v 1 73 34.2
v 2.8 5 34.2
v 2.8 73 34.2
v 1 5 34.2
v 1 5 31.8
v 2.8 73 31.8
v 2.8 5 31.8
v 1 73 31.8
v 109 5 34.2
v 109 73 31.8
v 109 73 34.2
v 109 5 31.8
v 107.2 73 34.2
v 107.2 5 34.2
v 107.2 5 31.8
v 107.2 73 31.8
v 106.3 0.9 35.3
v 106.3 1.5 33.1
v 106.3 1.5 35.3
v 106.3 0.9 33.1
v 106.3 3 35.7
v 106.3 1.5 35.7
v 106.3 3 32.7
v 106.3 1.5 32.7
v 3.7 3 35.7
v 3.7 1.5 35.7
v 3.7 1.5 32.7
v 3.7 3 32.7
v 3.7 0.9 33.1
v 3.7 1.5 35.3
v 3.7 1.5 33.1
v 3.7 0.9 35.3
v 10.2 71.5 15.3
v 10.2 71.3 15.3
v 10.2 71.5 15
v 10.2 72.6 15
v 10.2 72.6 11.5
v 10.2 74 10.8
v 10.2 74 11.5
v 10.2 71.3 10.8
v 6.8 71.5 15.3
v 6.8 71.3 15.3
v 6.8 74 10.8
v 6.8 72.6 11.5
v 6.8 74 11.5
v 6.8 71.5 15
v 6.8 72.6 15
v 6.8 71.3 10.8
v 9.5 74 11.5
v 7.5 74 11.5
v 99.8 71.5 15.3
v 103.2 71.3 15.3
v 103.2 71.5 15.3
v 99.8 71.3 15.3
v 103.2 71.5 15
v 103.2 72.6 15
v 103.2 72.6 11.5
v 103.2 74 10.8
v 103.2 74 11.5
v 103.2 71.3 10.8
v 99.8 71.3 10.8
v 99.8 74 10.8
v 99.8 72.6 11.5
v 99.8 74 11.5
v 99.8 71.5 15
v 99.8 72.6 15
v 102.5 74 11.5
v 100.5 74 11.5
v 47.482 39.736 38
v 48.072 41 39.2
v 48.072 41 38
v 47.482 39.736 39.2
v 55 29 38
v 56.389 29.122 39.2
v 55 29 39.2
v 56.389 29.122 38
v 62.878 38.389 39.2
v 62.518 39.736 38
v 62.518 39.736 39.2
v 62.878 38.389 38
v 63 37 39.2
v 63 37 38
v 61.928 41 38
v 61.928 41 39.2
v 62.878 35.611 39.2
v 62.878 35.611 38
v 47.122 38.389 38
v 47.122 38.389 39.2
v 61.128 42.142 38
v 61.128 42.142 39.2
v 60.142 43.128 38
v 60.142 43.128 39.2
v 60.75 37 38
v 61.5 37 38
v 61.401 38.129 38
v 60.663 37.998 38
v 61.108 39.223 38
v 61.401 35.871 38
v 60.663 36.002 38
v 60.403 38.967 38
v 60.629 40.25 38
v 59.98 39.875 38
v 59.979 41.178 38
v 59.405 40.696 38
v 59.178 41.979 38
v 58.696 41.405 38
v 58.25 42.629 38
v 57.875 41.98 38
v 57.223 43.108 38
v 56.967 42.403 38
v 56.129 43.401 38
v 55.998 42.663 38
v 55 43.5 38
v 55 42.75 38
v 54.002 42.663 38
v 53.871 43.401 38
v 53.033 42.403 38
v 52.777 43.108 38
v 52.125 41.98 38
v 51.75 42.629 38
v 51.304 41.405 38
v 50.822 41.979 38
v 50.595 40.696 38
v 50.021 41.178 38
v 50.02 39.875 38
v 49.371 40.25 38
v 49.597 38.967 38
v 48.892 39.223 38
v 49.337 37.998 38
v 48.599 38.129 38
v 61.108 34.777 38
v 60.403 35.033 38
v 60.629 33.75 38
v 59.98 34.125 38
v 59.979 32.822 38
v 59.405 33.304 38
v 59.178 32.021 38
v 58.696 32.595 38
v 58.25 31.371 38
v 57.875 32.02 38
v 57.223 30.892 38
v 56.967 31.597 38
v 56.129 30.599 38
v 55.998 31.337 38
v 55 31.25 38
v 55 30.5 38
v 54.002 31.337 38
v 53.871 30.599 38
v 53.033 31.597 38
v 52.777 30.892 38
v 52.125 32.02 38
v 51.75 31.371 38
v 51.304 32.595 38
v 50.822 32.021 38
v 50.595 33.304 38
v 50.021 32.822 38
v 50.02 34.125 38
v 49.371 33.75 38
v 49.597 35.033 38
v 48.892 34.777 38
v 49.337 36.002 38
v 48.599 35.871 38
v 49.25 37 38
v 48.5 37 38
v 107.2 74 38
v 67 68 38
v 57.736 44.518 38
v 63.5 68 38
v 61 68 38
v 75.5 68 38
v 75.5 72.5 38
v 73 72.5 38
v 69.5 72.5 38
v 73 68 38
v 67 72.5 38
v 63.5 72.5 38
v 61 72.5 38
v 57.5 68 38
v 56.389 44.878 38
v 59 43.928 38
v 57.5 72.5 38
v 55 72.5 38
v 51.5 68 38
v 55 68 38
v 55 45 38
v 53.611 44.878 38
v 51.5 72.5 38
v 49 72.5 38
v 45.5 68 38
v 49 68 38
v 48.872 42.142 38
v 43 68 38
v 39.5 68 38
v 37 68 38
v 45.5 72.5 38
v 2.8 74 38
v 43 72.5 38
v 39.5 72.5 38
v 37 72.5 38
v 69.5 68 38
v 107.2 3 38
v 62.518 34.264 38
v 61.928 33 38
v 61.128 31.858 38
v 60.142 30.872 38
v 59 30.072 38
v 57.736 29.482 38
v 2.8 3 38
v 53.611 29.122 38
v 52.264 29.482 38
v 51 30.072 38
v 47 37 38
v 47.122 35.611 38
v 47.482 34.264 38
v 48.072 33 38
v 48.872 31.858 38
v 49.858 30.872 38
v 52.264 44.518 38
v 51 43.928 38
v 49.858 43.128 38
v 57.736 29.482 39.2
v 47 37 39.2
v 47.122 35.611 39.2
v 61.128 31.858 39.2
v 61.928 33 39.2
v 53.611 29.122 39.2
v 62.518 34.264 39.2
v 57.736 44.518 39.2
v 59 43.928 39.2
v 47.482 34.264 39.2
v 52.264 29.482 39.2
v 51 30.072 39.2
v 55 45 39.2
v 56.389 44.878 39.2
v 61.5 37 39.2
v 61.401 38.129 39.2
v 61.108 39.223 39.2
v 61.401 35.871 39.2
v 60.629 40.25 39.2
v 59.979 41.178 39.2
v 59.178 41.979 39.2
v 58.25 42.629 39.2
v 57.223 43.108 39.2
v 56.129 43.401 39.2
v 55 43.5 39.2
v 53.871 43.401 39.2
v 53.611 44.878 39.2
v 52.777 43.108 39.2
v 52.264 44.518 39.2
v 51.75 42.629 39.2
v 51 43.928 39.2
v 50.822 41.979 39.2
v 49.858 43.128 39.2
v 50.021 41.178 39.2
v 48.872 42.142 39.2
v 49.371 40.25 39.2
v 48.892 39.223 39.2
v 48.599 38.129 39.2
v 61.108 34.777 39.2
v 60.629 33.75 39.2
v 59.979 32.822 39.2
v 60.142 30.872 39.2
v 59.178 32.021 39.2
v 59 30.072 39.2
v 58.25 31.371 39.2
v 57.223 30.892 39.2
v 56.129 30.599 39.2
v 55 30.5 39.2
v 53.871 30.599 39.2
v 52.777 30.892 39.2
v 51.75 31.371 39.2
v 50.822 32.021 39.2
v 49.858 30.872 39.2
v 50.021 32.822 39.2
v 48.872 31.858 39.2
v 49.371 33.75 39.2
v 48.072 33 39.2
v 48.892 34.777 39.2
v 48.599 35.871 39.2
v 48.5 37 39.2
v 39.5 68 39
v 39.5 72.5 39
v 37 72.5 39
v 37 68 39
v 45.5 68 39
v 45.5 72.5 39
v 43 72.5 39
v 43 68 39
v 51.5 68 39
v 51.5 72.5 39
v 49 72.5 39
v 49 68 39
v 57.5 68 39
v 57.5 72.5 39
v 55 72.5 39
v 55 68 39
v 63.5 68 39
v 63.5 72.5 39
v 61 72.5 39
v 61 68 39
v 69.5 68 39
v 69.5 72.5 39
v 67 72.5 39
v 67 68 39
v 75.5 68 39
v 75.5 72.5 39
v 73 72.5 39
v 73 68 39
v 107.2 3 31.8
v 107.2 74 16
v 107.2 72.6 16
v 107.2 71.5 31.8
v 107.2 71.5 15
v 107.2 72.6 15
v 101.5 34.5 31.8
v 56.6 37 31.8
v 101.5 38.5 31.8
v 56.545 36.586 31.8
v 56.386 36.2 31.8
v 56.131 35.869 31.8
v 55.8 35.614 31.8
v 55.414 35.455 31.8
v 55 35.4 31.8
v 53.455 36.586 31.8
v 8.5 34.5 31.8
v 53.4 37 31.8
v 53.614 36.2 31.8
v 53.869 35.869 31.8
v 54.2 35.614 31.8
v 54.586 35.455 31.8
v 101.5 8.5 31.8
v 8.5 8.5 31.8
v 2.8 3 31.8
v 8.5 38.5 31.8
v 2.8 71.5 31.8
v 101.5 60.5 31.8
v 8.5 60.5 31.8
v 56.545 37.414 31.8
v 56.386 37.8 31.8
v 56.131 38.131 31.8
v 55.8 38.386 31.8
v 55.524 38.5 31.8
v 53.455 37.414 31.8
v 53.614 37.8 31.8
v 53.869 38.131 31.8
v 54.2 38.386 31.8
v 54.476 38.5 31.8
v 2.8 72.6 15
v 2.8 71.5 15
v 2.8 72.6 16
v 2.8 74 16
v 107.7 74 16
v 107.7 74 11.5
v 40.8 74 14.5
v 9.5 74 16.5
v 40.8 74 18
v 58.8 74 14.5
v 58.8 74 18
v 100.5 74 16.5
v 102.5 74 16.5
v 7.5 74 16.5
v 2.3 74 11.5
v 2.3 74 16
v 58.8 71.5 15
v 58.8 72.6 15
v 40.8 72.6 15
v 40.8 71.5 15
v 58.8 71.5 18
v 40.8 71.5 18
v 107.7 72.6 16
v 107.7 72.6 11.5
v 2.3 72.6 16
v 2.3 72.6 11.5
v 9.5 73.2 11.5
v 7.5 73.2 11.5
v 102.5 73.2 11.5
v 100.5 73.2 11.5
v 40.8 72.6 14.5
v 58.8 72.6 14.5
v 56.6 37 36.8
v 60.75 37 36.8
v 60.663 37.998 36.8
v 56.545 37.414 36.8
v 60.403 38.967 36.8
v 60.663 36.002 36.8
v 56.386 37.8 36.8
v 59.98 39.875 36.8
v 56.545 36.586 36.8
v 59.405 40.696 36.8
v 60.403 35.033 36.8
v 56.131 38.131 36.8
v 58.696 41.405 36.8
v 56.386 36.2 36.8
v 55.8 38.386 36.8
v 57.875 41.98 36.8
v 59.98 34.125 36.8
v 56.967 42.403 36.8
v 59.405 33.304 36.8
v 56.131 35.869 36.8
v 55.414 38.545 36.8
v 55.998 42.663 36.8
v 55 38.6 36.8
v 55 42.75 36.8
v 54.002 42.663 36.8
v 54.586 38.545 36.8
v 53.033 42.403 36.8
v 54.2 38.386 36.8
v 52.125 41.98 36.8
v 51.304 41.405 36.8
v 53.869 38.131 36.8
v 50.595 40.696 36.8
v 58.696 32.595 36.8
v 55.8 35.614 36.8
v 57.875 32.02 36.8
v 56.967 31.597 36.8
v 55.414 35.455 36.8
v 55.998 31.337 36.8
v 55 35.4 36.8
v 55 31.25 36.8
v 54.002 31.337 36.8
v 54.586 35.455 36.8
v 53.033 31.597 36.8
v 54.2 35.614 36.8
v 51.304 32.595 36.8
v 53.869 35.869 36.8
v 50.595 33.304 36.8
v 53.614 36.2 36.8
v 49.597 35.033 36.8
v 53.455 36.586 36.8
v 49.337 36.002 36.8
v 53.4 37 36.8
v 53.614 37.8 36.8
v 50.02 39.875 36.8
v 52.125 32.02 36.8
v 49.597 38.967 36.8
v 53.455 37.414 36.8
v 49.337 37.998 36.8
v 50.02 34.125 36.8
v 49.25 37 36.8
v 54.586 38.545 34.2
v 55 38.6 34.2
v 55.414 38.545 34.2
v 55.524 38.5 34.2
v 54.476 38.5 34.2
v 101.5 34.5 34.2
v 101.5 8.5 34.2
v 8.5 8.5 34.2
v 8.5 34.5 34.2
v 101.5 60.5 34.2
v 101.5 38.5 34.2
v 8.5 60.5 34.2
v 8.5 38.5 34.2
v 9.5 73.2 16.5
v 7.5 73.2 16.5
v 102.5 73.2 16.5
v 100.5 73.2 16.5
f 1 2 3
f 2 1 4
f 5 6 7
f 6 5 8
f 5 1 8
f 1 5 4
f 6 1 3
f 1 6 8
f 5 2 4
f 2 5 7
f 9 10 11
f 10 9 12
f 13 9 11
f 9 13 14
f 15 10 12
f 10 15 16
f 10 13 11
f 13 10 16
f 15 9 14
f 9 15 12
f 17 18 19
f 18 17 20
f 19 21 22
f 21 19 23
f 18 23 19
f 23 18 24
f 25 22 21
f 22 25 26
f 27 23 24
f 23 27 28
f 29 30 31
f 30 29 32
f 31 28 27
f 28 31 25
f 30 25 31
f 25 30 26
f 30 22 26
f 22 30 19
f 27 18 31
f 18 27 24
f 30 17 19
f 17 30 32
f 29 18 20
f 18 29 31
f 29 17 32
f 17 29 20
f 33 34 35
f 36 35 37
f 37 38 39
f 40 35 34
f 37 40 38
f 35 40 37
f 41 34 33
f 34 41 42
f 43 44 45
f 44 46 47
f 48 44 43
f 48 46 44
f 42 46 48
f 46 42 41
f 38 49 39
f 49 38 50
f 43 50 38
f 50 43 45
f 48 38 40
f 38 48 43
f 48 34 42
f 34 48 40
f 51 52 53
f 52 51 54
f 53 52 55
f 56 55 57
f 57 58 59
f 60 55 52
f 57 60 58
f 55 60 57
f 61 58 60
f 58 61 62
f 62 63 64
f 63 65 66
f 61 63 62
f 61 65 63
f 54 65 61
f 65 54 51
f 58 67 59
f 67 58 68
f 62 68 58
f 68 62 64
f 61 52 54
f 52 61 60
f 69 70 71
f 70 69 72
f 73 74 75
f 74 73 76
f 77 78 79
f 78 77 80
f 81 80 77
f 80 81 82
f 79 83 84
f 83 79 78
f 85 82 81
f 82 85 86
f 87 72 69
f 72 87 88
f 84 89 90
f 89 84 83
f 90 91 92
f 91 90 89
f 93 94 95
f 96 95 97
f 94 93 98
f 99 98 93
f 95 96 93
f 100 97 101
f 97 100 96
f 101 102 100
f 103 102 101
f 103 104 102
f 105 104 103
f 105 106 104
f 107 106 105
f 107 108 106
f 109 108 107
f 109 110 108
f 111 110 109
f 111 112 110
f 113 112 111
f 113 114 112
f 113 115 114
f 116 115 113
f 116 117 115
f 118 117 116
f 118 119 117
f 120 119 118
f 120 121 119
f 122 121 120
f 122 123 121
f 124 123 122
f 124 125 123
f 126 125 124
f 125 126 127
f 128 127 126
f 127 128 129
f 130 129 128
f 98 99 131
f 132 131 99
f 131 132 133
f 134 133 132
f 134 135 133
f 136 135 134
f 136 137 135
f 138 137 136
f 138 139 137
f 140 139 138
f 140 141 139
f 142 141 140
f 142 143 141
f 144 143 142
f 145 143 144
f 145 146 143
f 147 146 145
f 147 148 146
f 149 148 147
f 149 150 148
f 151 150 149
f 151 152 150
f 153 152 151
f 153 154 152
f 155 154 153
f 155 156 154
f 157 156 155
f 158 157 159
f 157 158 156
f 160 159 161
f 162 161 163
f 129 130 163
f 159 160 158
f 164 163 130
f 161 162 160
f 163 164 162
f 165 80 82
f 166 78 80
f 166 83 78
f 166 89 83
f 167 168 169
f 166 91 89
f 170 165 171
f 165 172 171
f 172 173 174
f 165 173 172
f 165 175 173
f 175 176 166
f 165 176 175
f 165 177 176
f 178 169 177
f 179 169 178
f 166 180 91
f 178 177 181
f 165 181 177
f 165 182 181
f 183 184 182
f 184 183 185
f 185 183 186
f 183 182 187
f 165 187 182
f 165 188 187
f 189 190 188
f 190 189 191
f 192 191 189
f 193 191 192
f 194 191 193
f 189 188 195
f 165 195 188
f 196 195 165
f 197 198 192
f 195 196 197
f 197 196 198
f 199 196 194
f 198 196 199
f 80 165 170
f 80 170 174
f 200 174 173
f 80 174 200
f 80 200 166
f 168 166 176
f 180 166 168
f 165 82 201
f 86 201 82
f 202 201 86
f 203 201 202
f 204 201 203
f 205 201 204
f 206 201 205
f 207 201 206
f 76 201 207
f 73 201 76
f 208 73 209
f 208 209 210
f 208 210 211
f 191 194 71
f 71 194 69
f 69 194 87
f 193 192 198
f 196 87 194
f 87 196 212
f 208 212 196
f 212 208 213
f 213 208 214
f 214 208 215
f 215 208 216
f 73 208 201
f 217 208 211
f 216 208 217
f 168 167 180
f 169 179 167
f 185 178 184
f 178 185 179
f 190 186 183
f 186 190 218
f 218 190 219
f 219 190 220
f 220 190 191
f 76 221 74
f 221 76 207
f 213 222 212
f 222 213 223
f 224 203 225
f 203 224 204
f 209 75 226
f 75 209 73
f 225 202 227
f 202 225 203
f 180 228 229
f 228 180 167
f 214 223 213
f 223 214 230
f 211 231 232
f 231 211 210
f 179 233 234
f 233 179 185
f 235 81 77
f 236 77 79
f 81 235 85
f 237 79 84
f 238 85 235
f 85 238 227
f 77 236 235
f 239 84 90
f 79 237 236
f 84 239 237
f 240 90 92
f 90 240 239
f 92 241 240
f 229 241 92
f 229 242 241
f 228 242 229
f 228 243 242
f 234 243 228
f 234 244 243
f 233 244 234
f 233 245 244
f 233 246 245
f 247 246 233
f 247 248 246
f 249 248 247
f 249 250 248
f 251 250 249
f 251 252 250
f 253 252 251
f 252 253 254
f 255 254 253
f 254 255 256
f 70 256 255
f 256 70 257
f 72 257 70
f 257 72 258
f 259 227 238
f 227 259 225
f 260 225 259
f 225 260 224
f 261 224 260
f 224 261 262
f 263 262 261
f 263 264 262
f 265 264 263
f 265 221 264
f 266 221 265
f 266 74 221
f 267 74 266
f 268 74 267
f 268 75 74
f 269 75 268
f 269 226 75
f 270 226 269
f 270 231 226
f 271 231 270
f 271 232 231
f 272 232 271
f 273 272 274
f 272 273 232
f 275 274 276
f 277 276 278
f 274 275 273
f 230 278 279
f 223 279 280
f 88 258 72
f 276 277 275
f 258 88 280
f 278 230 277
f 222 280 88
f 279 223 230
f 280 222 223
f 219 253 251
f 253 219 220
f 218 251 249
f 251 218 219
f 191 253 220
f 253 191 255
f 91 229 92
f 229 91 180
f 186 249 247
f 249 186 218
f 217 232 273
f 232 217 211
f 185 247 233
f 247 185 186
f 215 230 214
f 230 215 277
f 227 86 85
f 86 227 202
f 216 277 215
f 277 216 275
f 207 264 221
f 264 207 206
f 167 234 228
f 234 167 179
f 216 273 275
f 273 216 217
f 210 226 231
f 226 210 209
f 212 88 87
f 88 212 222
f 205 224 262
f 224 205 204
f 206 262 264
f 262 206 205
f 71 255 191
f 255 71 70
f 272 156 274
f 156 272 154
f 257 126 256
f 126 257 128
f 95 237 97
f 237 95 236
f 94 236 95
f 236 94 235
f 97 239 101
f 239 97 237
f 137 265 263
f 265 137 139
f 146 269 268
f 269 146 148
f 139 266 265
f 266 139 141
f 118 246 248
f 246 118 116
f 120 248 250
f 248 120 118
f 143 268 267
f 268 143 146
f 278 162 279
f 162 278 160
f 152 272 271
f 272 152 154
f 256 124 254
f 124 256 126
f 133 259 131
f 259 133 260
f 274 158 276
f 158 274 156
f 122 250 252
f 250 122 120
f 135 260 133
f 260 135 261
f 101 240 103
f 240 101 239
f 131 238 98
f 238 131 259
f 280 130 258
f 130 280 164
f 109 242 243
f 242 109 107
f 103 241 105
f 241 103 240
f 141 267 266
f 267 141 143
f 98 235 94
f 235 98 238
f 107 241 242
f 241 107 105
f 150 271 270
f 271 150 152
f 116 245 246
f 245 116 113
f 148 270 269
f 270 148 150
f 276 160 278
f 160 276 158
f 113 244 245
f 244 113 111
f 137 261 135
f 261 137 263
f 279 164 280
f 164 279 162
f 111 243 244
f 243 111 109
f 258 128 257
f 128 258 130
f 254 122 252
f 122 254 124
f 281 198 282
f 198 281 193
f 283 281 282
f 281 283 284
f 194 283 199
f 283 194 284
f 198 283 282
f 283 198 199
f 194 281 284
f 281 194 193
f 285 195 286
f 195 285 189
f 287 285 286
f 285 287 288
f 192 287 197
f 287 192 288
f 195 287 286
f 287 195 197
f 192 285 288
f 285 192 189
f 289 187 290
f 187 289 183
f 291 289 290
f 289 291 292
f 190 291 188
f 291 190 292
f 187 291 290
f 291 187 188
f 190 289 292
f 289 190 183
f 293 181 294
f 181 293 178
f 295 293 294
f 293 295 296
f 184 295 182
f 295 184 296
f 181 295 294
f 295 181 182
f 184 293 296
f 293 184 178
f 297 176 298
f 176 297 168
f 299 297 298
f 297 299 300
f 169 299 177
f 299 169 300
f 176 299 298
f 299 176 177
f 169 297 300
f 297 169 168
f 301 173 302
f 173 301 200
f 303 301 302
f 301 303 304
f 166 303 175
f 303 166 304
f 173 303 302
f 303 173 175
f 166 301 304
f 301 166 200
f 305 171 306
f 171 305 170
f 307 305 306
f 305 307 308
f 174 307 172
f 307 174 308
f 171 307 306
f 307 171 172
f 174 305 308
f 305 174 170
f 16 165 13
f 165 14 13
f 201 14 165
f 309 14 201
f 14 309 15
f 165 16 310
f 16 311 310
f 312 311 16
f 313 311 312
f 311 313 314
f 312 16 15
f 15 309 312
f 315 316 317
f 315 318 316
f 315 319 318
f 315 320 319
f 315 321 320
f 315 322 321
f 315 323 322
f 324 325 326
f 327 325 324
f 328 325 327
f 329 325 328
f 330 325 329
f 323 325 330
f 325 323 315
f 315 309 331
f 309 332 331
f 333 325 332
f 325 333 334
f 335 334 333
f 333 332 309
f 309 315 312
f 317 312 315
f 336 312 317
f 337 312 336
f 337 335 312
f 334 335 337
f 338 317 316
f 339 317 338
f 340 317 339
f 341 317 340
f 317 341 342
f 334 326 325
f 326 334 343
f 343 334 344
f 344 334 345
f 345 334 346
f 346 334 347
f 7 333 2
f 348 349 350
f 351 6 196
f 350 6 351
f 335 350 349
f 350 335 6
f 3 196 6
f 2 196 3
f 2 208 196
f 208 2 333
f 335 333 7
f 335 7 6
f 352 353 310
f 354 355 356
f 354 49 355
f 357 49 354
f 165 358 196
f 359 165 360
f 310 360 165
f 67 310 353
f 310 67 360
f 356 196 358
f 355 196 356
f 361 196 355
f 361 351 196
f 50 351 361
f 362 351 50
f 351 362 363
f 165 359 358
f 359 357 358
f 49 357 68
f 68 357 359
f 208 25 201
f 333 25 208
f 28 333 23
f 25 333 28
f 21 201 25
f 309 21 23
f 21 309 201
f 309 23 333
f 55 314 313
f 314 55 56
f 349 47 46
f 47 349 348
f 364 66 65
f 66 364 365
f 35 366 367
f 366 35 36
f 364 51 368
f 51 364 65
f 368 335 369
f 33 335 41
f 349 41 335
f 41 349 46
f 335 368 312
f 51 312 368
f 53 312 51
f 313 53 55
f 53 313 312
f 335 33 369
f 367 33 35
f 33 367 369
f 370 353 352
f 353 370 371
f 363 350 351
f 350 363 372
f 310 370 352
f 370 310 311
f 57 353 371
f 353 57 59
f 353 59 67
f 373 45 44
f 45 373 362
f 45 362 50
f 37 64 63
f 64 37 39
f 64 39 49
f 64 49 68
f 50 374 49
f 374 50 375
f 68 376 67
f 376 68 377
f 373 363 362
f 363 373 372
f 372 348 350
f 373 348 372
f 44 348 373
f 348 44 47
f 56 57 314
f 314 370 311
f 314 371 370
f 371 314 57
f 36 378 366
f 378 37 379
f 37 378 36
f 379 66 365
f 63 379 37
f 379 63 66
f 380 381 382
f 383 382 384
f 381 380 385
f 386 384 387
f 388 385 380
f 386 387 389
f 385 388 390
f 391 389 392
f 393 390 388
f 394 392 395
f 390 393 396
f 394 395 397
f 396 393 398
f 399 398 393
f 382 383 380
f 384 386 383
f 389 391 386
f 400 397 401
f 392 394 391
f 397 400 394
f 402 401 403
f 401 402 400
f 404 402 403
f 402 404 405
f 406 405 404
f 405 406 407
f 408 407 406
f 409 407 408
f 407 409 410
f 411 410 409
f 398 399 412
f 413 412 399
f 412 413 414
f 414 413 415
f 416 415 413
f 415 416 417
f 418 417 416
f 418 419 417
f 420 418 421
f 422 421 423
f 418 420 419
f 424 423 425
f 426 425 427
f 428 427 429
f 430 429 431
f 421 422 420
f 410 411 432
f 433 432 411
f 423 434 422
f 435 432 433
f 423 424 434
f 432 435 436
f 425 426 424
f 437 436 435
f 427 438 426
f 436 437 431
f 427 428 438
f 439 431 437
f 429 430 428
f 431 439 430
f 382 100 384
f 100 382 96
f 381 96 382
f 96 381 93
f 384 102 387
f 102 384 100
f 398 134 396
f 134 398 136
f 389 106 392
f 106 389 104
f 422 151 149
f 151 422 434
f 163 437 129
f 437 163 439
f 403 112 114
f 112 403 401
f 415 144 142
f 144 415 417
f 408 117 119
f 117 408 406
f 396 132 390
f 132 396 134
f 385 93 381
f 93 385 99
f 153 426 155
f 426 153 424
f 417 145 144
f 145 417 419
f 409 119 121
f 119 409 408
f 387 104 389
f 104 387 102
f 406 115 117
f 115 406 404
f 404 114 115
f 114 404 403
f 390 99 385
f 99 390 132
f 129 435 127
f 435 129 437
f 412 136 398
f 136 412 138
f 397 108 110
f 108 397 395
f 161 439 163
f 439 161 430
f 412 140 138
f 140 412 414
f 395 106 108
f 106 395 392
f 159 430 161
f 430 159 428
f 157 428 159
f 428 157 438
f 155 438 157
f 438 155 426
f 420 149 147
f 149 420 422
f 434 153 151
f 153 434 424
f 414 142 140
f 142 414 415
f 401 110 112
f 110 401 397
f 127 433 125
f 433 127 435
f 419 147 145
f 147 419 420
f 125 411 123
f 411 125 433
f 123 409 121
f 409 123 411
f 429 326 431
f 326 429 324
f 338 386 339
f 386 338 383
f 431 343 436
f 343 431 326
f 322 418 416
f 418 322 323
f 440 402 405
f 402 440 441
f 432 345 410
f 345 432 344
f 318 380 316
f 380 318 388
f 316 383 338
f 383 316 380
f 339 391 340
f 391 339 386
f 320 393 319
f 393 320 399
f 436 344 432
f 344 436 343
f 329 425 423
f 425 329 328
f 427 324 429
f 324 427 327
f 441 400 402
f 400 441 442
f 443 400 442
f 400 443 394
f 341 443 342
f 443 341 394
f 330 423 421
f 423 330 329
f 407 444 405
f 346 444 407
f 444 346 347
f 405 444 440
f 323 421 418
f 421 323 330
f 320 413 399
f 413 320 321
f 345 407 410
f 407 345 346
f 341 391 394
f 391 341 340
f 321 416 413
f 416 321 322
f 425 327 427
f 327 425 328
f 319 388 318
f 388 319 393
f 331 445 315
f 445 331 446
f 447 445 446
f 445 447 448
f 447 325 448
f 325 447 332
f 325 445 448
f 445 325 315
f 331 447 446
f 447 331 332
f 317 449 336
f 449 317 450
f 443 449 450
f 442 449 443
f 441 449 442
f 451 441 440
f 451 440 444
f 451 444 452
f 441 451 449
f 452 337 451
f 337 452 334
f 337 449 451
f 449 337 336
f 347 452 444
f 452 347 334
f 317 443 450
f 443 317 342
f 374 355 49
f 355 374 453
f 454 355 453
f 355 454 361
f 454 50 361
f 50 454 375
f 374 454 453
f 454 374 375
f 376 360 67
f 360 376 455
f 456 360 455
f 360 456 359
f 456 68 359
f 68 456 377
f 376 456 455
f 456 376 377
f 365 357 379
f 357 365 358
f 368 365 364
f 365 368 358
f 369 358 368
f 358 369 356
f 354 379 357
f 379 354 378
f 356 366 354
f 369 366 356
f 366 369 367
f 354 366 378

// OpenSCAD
// file: ../00_common/parameters.scad
// =============================================================================
// OpenMotorBridge - Global CAD Parameters & Settings
// =============================================================================
// File: hardware/cad/scad/00_common/parameters.scad
// Description: Global dimensional constants, manufacturing clearances and
//              circle resolution ($fn) for all OpenSCAD modules.
// =============================================================================

// --- 1. Circle & Curve Resolution ---
$fn = 60; // Smooth cylinders and holes for high-quality MJF 3D printing

// --- 2. Central Main Box Dimensions (v10 Dual-Rail Monocoque Slide-In Platform) ---
MAIN_BOX_OUTER_L      = 110.0; // Outer length in X (mm)
MAIN_BOX_OUTER_W      = 74.0;  // Outer width in Y (mm)
MAIN_BOX_TOTAL_H      = 38.0;  // Total height in Z (mm)
MAIN_BOX_LOWER_H      = 17.0;  // Reference lower deck height (mm)
MAIN_BOX_MID_H        = 15.0;  // Reference mid tray height (mm)
MAIN_BOX_LID_H        = 6.0;   // L-Slide lid top thickness (mm)
MAIN_BOX_WALL         = 2.5;   // Nominal wall thickness in PA12 (mm)
MAIN_BOX_CORNER_R     = 3.5;   // Vertical corner fillet radius (mm)

// Dual-Rail Slide-In Guide Heights:
MAIN_BOX_RAIL1_Z      = 18.0;  // Rail 1 center height: Slide-In Zwischenboden (mm)
MAIN_BOX_RAIL1_H      = 2.4;   // Rail 1 groove height (mm)
MAIN_BOX_RAIL1_DEPTH  = 1.5;   // Rail 1 groove depth in sidewall (mm)
MAIN_BOX_RAIL2_Z      = 33.0;  // Rail 2 center height: L-Slide Lid C-groove (mm)
MAIN_BOX_RAIL2_H      = 2.8;   // Rail 2 groove height (mm)
MAIN_BOX_RAIL2_DEPTH  = 1.8;   // Rail 2 groove depth in sidewall (mm)
MAIN_BOX_REAR_SILL_H  = 15.0;  // Fixed lower rear sill height (mm)

// --- 3. Satellite Pod Dimensions (Universal Enlarged Envelope) ---
POD_OUTER_L           = 150.0; // Outer length in X (mm, standardized for serial PCBA 03 + Cardo/Sena/OMM)
POD_OUTER_W           = 70.0;  // Outer width in Y (mm)
POD_OUTER_H           = 38.0;  // Outer height in Z (mm)
POD_WALL              = 3.5;   // Nominal wall thickness (mm)
POD_BULKHEAD_X        = 18.0;  // Partition bulkhead position in X (mm)
POD_CHAMBER_L         = 132.0; // Sliding chamber length in X (mm, clears 130mm sled + 2mm margin)
POD_CHAMBER_W         = 63.0;  // Sliding chamber width in Y (mm)
POD_CHAMBER_H         = 31.0;  // Sliding chamber height in Z (mm)

// --- 4. Pod Linear Guide Rails (Poka-Yoke Tongue & Groove) ---
POD_GROOVE_W          = 3.0;   // Internal guide groove width in Z (mm)
POD_GROOVE_DEPTH      = 1.5;   // Internal guide groove depth in Y (mm)
POD_GROOVE_LEFT_Z     = 10.0;  // Center height of left groove (mm)
POD_GROOVE_RIGHT_Z    = 18.0;  // Center height of right groove (mm, asym offset)

CARTRIDGE_TONGUE_W    = 2.6;   // Cartridge tongue rail height in Z (mm, 0.2mm clearance)
CARTRIDGE_TONGUE_PROT = 1.4;   // Cartridge tongue protrusion in Y (mm, 0.1mm clearance)
CARTRIDGE_CHAMFER_L   = 4.0;   // 30° lead-in chamfer nose length (mm)

// --- 5. Cartridge Dimensions (Enlarged Universal Sled) ---
CARTRIDGE_BASE_L      = 130.0; // Sled length in X (mm, accommodates PCBA 03 + OEM Cardo Air-Mount/Sena/OMM serial layout)
CARTRIDGE_BASE_W      = 58.0;  // Sled width in Y (mm)
CARTRIDGE_BASE_H      = 28.0;  // Sled height in Z (mm)
CARTRIDGE_FACE_L      = 4.0;   // Front faceplate thickness in X (mm)
CARTRIDGE_FACE_W      = 64.0;  // Front faceplate width in Y (mm)
CARTRIDGE_FACE_H      = 34.0;  // Front faceplate height in Z (mm)

// --- 5a. RF Interface & Sealing Dimensions ---
SMA_BORE_R            = 3.25;  // Ø 6.5 mm through-hole for standard SMA bulkhead
SMA_ORECESS_R         = 4.75;  // Ø 9.5 mm recess for waterproof silicone O-ring
SMA_ORECESS_DEPTH     = 1.2;   // 1.2 mm deep O-ring compression pocket

// --- 5b. Magnetic Anti-Theft Lock System ---
LATCH_PIVOT_X         = 65.0;  // Center pivot position along sled X (mm, centered on 130mm sled)
LATCH_MAGNET_X        = 53.0;  // Ferromagnetic anchor position along sled X (mm)
LATCH_TOOTH_X         = 77.0;  // Locking sawtooth pawl position along sled X (mm)
LATCH_ARM_H           = 6.0;   // Rocker lever height in Z (mm)
LATCH_ARM_THICK       = 2.6;   // Rocker beam thickness in Y (mm)
LATCH_MAGNET_PIN_DIA  = 6.2;   // Bore for Ø 6.0 mm steel dowel pin (mm)
LATCH_SPRING_DIA      = 3.8;   // Bore for Ø 3.5 mm return compression spring (mm)

// --- 6. Standard Captive Hex Nut Pockets (DIN 934 / DIN 985 with +0.2 mm MJF/FDM clearance) ---
NUT_M2_SW             = 4.2;   // M2 across flats (nominal 4.0 mm)
NUT_M2_H              = 1.8;   // M2 thickness (nominal 1.6 mm)
NUT_M2_5_SW           = 5.2;   // M2.5 across flats (nominal 5.0 mm)
NUT_M2_5_H            = 2.2;   // M2.5 thickness (nominal 2.0 mm)
NUT_M3_SW             = 5.7;   // M3 across flats (nominal 5.5 mm)
NUT_M3_H              = 2.6;   // M3 thickness (nominal 2.4 mm)
NUT_M4_SW             = 7.2;   // M4 across flats (nominal 7.0 mm)
NUT_M4_H              = 3.4;   // M4 thickness (nominal 3.2 mm)
NUT_M5_SW             = 8.2;   // M5 across flats (nominal 8.0 mm)
NUT_M5_H              = 4.2;   // M5 thickness (nominal 4.0 mm)

// Direct Plastic Thread-Forming / Self-Tapping Pilot Holes in PA12 (100% Soldering-Iron Free)
M2_PILOT_HOLE_R       = 0.85;  // Core hole for M2 screws in PA12 (Ø 1.7 mm)
M2_5_PILOT_HOLE_R     = 1.05;  // Core hole for M2.5 screws in PA12 (Ø 2.1 mm)
M3_PILOT_HOLE_R       = 1.25;  // Core hole for M3 screws in PA12 (Ø 2.5 mm)

// --- 7. Screw & Clearance Dimensions ---
M2_SCREW_HOLE_R       = 1.1;   // M2 clearance hole (r = 1.1 mm -> Ø 2.2 mm)
M2_5_SCREW_HOLE_R     = 1.4;   // M2.5 clearance hole (r = 1.4 mm -> Ø 2.8 mm)
M3_SCREW_HOLE_R       = 1.65;  // M3 clearance hole (r = 1.65 mm -> Ø 3.3 mm)
M4_SCREW_HOLE_R       = 2.2;   // M4 clearance hole (r = 2.2 mm -> Ø 4.4 mm)
M8_BORE_R             = 4.0;   // M8 cable through-bore (r = 4.0 mm -> Ø 8.0 mm)
M8_STUDS_OUTER_R      = 6.0;   // M8 neck outer radius (Ø 12.0 mm)

// --- 8. Universal Front Node Enclosure Dimensions (Type E: 98 x 68 x 25 mm) ---
FRONT_NODE_PCB_L      = 82.0;  // PCB length in X (mm, PCBA 05)
FRONT_NODE_PCB_W      = 50.0;  // PCB width in Y (mm, PCBA 05)
FRONT_NODE_PCB_H      = 1.6;   // PCB thickness in Z (mm)
FRONT_NODE_PCB_R      = 2.5;   // PCB corner radius (mm)

FRONT_NODE_CHAMBER_L  = 86.0;  // Internal chamber length in X (mm, 2mm margin per side)
FRONT_NODE_CHAMBER_W  = 56.0;  // Internal chamber width in Y (mm, 3mm margin per side)
FRONT_NODE_TUB_H      = 17.5;  // Lower tub depth in Z (mm)
FRONT_NODE_LID_H      = 7.5;   // Upper lid height in Z (mm)
FRONT_NODE_WALL       = 2.5;   // Wall thickness in HP MJF PA12 (mm)
FRONT_NODE_CORNER_R   = 4.0;   // Outer enclosure corner radius (mm)

FRONT_NODE_OUTER_L    = FRONT_NODE_CHAMBER_L + 2 * FRONT_NODE_WALL + 7.0; // 98.0 mm
FRONT_NODE_OUTER_W    = FRONT_NODE_CHAMBER_W + 2 * FRONT_NODE_WALL + 7.0; // 68.0 mm
FRONT_NODE_OUTER_H    = FRONT_NODE_TUB_H + FRONT_NODE_LID_H;              // 25.0 mm

// PCB Standoff Heights & Radii (100% Soldering-Iron Free)
FRONT_NODE_STANDOFF_H = 3.0;   // Height of PCB standoffs from floor (mm)
FRONT_NODE_STANDOFF_R = 3.0;   // Outer radius of M2.5 screw bosses (mm)
FRONT_NODE_CORE_HOLE_R= M2_5_PILOT_HOLE_R; // Core hole for direct M2.5 screw engagement (Ø 2.1 mm)

// AMPS 4-Hole Mounting Pattern (38 x 30 mm with DIN 934 M4 Captive Nut Pockets)
AMPS_SPACING_X        = 38.0;  // AMPS hole distance in X (mm)
AMPS_SPACING_Y        = 30.0;  // AMPS hole distance in Y (mm)
AMPS_NUT_SW           = NUT_M4_SW; // Captive M4 hex nut pocket across flats (7.2 mm)
AMPS_NUT_H            = NUT_M4_H;  // Captive M4 hex nut pocket depth (3.4 mm)

// Acoustic Vent for Knowles SPH0645 MEMS
FRONT_NODE_MIC_HOLE_R = 1.25;  // Sound canal radius (Ø 2.5 mm)
FRONT_NODE_MIC_MEMB_R = 3.0;   // Gore ePTFE membrane pocket radius (Ø 6.0 mm)
FRONT_NODE_MIC_MEMB_D = 0.8;   // Membrane pocket depth (mm)
// main file
// =============================================================================
// OpenMotorBridge - Central Main Box: Complete L-Slide Lid (v10.0)
// =============================================================================
// File: hardware/cad/scad/01_main_box/02_colsure.scad
// Description: Ready-to-print L-shaped slide lid (Schiebedeckel) for the
//              Central Box (Gehäuse Typ A) utilizing the v10 Dual-Rail Principle:
//              - Form-fit slide-in mounting on Rail 2 (Z = 33.0 mm) C-grooves.
//              - Front wedge-lock nose (Keilanzug) for front gasket compression.
//              - Integrated Gore ePTFE pressure compensation membrane seat.
//              - Vertical rear Heckwand with drip apron overlapping lower sill.
//              - 100% non-metallic PA12 Slam-to-Shut deadbolt locking system.
// =============================================================================

include <../00_common/parameters.scad>;
use <parts/020_slide_lid.scad>;

module main_box_lid() {
    main_box_slide_lid(
        length = MAIN_BOX_OUTER_L,
        width  = MAIN_BOX_OUTER_W,
        height = MAIN_BOX_TOTAL_H,
        wall   = MAIN_BOX_WALL
    );
}

// Render complete slide lid
main_box_lid();
